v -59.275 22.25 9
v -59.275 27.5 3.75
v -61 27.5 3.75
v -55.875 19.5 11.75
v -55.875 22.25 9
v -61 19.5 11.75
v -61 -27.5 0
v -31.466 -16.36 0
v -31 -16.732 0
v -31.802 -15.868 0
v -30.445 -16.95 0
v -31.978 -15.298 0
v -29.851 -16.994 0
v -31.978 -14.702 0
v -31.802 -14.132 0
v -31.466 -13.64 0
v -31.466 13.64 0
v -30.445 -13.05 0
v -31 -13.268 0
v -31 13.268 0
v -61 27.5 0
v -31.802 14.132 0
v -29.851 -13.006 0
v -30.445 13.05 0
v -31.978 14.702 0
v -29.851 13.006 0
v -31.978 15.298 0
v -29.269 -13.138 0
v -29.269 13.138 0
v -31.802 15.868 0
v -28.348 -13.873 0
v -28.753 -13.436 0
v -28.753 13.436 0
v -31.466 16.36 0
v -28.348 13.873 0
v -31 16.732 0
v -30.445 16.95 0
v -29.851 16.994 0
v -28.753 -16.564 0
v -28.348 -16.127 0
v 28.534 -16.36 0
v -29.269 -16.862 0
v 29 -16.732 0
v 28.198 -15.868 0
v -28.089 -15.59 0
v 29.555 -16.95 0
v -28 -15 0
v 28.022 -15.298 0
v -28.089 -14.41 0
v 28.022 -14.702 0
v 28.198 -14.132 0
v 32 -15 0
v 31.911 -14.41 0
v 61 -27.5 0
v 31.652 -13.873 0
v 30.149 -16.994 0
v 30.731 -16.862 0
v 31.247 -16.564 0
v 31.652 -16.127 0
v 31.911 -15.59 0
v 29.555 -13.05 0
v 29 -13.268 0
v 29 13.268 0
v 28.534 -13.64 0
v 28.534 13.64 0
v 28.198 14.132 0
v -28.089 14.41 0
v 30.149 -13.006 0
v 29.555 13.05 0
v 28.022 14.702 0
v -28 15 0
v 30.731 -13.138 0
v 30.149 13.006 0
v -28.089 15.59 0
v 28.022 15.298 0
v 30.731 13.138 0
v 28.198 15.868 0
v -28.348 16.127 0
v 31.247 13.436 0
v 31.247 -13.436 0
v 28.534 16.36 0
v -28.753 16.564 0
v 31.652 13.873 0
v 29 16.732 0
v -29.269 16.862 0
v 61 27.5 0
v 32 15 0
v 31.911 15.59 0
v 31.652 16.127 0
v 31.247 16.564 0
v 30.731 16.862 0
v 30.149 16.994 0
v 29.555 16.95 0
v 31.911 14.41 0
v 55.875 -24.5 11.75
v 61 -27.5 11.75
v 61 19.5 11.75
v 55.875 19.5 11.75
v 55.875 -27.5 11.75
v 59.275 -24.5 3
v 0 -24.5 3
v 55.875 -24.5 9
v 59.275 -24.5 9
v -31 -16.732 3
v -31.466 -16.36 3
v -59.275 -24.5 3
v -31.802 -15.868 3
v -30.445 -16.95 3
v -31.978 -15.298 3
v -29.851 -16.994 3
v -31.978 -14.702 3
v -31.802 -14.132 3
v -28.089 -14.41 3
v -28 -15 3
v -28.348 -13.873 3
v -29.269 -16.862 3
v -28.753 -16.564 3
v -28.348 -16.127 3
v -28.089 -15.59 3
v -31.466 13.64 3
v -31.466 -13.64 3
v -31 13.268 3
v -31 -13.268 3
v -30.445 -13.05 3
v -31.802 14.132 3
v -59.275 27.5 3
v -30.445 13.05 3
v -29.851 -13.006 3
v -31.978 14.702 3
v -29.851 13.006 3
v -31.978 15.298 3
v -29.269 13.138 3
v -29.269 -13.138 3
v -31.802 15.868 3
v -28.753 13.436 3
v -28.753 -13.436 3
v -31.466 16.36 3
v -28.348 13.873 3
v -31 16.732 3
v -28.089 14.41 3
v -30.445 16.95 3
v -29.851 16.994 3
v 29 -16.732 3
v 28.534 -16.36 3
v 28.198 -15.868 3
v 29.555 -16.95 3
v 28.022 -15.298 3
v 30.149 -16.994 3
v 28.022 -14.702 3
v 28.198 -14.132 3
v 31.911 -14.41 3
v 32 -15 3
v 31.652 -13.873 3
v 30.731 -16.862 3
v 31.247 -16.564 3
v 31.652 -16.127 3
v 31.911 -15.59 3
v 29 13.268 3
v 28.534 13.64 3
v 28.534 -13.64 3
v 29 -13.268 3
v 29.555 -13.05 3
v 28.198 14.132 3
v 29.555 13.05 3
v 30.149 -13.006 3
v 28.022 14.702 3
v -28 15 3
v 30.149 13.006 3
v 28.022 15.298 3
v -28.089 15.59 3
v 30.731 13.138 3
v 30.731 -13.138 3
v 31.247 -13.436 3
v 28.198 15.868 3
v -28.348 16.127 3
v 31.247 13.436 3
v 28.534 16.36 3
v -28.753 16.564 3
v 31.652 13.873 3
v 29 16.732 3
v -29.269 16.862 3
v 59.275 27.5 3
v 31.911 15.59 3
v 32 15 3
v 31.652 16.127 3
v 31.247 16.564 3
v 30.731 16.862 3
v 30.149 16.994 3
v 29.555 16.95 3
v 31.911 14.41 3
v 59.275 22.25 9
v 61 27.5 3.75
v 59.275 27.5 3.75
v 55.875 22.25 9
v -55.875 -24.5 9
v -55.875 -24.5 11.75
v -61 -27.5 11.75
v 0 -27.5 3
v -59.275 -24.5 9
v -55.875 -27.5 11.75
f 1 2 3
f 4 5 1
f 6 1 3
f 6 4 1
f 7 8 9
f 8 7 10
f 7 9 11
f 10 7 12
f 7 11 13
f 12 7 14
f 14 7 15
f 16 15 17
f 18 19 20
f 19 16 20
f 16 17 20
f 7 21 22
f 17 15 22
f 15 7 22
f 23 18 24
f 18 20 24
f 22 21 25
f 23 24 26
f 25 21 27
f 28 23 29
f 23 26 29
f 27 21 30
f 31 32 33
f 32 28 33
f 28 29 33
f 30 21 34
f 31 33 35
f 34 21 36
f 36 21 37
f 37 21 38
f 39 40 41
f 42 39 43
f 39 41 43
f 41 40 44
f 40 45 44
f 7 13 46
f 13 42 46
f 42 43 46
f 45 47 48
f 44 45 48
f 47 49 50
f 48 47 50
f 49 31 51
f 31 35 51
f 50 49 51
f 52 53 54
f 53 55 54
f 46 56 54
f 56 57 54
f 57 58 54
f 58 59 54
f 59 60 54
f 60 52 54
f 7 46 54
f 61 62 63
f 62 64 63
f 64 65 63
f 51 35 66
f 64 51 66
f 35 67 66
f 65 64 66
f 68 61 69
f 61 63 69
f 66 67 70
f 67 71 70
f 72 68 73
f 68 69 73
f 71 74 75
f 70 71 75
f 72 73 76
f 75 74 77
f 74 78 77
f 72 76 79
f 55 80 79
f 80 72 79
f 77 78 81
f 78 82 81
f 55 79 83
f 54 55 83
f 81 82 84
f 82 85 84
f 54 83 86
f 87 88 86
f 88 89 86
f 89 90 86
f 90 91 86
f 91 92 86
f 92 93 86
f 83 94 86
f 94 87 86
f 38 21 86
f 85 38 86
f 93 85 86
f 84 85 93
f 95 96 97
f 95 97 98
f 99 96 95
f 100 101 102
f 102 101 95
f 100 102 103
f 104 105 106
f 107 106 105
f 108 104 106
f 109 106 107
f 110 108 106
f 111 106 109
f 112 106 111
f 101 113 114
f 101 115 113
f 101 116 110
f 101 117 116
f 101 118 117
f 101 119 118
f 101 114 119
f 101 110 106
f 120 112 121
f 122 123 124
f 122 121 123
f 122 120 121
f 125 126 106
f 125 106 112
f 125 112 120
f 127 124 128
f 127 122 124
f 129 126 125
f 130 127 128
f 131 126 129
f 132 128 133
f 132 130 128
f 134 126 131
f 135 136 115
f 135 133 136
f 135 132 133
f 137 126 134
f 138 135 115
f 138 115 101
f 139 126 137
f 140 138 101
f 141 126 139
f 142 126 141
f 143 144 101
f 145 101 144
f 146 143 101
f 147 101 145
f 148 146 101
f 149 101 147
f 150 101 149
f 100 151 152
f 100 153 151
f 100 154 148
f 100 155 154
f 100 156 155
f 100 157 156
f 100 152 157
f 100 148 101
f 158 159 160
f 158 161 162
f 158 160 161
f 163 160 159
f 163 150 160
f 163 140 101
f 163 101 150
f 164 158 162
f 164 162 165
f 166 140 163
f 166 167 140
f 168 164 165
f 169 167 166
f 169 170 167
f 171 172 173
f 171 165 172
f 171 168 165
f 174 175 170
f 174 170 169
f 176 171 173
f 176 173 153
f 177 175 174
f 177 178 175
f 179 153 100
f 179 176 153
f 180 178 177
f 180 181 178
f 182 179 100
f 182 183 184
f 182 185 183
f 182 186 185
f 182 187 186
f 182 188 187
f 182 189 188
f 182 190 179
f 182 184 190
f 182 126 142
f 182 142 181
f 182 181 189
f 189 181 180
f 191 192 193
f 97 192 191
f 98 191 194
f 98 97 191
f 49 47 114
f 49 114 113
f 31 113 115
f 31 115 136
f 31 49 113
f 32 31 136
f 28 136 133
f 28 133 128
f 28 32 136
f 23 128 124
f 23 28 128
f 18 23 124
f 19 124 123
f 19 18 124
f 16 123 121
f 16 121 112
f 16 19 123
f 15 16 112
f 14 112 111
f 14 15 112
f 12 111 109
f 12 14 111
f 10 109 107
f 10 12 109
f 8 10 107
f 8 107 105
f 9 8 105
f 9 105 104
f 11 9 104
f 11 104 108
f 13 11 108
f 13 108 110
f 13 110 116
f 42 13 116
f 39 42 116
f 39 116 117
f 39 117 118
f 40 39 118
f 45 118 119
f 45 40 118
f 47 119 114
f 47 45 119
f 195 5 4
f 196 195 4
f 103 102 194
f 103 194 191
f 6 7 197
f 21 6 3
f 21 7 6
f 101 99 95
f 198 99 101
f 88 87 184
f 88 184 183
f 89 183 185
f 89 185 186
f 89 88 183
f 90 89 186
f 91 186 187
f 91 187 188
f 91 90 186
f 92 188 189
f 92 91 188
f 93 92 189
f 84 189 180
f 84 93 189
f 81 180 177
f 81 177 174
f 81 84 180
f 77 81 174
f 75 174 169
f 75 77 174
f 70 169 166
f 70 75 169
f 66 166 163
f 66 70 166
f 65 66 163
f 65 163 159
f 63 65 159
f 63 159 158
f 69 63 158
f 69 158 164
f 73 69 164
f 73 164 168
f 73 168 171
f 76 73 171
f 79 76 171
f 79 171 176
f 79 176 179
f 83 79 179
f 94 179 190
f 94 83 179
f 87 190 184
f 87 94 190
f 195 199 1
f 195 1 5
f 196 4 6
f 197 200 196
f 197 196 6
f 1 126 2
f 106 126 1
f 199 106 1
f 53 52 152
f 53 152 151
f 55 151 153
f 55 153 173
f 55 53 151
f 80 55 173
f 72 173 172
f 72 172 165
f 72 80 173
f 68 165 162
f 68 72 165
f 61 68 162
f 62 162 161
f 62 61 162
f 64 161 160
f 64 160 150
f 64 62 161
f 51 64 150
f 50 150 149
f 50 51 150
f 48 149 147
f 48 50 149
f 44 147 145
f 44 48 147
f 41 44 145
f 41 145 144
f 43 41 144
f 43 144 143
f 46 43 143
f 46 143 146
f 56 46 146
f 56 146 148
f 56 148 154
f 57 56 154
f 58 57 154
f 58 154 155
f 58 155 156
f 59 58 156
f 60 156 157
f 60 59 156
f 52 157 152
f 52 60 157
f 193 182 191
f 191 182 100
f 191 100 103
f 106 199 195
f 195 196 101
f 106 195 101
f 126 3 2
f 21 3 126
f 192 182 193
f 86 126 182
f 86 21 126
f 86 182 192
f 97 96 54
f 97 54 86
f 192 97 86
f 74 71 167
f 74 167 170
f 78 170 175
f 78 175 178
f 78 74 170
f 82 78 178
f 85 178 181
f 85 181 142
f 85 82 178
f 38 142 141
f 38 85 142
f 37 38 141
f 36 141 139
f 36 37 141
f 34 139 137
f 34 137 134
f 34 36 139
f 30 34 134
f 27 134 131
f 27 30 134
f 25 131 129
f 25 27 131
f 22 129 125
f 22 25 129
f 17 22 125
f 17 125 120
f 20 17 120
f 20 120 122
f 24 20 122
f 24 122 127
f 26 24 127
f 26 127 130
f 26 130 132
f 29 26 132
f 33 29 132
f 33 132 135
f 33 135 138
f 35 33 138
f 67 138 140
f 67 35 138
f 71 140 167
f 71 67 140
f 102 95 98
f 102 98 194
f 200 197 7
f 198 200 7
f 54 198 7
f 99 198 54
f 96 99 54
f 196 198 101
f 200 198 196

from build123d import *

# Parameters (mm, degrees)
F0_W      = 120
F0_H      = 55
F0_R      = 2
F1_DEPTH  = 3
F2_W      = 1.125
F2_H      = 55
F3_DEPTH  = 6
F5_DEPTH  = 55
F6_W      = 0.4
F6_H      = 6
F7_DEPTH  = 56.2
F9_DEPTH  = 3
F10_SIZE  = 8
F11_W     = 9.086206
F11_H     = 67.30528
F11_W_2   = 12.61974
F11_H_2   = 69.156178
F12_DEPTH = 12.5


with BuildPart() as f1:
    # F0 (on Top) → F1 (new body)
    with BuildSketch(Plane.XY):
        Rectangle(F0_W, F0_H)
        with Locations((-30, -15)):
            Circle(F0_R, mode=Mode.SUBTRACT)
        with Locations((30, -15)):
            Circle(F0_R, mode=Mode.SUBTRACT)
        with Locations((-30, 15)):
            Circle(F0_R, mode=Mode.SUBTRACT)
        with Locations((30, 15)):
            Circle(F0_R, mode=Mode.SUBTRACT)
    extrude(amount=F1_DEPTH)

    # F2 (on face) → F3 (join)
    with BuildSketch(Plane.XY.offset(3)):
        with Locations((59.4375, 0)):
            Rectangle(F2_W, F2_H)
        with Locations((-59.4375, 0)):
            Rectangle(F2_W, F2_H)
    extrude(amount=F3_DEPTH)

    # F4 (on face) → F5 (join)
    with BuildSketch(Plane.XZ.offset(27.5)):
        Polygon((-52.744724, 0), (-58.875, 3), (-58.875, 9), (-55.875, 9), (-55.875, 11.75), (-61.875, 11.75), (-61.875, 0), align=None)
        Polygon((61.875, 11.75), (55.875, 11.75), (55.875, 9), (58.875, 9), (58.875, 3), (52.744724, 0), (61.875, 0), align=None)
    extrude(amount=-F5_DEPTH)

    # F6 (on face) → F7 (cut)
    with BuildSketch(Plane.XZ.offset(27.5)):
        with Locations((-59.075, 6)):
            Rectangle(F6_W, F6_H)
        with Locations((59.075, 6)):
            Rectangle(F6_W, F6_H)
    extrude(amount=-F7_DEPTH, mode=Mode.SUBTRACT)

    # F8 (on face) → F9 (join)
    with BuildSketch(Plane.XZ.offset(27.5)):
        Polygon((0, 3), (-55.875, 11.75), (-61.875, 11.75), (-61.875, 0), (61.875, 0), (61.875, 11.75), (55.875, 11.75), align=None)
    extrude(amount=-F9_DEPTH)

    # F10
    f10_edges = [f1.edges().sort_by_distance(p)[0] for p in [
        (58.875, 27.5, 11.75),
        (-58.875, 27.5, 11.75),
    ]]
    chamfer(f10_edges, length=F10_SIZE)

    # F11 (on face) → F12 (cut, symmetric)
    with BuildSketch(Plane.XY.offset(3)):
        with Locations((-65.543103, -0.961821)):
            Rectangle(F11_W, F11_H)
        with Locations((67.30987, -1.382478)):
            Rectangle(F11_W_2, F11_H_2)
    extrude(amount=F12_DEPTH, both=True, mode=Mode.SUBTRACT)


solid = f1.part
